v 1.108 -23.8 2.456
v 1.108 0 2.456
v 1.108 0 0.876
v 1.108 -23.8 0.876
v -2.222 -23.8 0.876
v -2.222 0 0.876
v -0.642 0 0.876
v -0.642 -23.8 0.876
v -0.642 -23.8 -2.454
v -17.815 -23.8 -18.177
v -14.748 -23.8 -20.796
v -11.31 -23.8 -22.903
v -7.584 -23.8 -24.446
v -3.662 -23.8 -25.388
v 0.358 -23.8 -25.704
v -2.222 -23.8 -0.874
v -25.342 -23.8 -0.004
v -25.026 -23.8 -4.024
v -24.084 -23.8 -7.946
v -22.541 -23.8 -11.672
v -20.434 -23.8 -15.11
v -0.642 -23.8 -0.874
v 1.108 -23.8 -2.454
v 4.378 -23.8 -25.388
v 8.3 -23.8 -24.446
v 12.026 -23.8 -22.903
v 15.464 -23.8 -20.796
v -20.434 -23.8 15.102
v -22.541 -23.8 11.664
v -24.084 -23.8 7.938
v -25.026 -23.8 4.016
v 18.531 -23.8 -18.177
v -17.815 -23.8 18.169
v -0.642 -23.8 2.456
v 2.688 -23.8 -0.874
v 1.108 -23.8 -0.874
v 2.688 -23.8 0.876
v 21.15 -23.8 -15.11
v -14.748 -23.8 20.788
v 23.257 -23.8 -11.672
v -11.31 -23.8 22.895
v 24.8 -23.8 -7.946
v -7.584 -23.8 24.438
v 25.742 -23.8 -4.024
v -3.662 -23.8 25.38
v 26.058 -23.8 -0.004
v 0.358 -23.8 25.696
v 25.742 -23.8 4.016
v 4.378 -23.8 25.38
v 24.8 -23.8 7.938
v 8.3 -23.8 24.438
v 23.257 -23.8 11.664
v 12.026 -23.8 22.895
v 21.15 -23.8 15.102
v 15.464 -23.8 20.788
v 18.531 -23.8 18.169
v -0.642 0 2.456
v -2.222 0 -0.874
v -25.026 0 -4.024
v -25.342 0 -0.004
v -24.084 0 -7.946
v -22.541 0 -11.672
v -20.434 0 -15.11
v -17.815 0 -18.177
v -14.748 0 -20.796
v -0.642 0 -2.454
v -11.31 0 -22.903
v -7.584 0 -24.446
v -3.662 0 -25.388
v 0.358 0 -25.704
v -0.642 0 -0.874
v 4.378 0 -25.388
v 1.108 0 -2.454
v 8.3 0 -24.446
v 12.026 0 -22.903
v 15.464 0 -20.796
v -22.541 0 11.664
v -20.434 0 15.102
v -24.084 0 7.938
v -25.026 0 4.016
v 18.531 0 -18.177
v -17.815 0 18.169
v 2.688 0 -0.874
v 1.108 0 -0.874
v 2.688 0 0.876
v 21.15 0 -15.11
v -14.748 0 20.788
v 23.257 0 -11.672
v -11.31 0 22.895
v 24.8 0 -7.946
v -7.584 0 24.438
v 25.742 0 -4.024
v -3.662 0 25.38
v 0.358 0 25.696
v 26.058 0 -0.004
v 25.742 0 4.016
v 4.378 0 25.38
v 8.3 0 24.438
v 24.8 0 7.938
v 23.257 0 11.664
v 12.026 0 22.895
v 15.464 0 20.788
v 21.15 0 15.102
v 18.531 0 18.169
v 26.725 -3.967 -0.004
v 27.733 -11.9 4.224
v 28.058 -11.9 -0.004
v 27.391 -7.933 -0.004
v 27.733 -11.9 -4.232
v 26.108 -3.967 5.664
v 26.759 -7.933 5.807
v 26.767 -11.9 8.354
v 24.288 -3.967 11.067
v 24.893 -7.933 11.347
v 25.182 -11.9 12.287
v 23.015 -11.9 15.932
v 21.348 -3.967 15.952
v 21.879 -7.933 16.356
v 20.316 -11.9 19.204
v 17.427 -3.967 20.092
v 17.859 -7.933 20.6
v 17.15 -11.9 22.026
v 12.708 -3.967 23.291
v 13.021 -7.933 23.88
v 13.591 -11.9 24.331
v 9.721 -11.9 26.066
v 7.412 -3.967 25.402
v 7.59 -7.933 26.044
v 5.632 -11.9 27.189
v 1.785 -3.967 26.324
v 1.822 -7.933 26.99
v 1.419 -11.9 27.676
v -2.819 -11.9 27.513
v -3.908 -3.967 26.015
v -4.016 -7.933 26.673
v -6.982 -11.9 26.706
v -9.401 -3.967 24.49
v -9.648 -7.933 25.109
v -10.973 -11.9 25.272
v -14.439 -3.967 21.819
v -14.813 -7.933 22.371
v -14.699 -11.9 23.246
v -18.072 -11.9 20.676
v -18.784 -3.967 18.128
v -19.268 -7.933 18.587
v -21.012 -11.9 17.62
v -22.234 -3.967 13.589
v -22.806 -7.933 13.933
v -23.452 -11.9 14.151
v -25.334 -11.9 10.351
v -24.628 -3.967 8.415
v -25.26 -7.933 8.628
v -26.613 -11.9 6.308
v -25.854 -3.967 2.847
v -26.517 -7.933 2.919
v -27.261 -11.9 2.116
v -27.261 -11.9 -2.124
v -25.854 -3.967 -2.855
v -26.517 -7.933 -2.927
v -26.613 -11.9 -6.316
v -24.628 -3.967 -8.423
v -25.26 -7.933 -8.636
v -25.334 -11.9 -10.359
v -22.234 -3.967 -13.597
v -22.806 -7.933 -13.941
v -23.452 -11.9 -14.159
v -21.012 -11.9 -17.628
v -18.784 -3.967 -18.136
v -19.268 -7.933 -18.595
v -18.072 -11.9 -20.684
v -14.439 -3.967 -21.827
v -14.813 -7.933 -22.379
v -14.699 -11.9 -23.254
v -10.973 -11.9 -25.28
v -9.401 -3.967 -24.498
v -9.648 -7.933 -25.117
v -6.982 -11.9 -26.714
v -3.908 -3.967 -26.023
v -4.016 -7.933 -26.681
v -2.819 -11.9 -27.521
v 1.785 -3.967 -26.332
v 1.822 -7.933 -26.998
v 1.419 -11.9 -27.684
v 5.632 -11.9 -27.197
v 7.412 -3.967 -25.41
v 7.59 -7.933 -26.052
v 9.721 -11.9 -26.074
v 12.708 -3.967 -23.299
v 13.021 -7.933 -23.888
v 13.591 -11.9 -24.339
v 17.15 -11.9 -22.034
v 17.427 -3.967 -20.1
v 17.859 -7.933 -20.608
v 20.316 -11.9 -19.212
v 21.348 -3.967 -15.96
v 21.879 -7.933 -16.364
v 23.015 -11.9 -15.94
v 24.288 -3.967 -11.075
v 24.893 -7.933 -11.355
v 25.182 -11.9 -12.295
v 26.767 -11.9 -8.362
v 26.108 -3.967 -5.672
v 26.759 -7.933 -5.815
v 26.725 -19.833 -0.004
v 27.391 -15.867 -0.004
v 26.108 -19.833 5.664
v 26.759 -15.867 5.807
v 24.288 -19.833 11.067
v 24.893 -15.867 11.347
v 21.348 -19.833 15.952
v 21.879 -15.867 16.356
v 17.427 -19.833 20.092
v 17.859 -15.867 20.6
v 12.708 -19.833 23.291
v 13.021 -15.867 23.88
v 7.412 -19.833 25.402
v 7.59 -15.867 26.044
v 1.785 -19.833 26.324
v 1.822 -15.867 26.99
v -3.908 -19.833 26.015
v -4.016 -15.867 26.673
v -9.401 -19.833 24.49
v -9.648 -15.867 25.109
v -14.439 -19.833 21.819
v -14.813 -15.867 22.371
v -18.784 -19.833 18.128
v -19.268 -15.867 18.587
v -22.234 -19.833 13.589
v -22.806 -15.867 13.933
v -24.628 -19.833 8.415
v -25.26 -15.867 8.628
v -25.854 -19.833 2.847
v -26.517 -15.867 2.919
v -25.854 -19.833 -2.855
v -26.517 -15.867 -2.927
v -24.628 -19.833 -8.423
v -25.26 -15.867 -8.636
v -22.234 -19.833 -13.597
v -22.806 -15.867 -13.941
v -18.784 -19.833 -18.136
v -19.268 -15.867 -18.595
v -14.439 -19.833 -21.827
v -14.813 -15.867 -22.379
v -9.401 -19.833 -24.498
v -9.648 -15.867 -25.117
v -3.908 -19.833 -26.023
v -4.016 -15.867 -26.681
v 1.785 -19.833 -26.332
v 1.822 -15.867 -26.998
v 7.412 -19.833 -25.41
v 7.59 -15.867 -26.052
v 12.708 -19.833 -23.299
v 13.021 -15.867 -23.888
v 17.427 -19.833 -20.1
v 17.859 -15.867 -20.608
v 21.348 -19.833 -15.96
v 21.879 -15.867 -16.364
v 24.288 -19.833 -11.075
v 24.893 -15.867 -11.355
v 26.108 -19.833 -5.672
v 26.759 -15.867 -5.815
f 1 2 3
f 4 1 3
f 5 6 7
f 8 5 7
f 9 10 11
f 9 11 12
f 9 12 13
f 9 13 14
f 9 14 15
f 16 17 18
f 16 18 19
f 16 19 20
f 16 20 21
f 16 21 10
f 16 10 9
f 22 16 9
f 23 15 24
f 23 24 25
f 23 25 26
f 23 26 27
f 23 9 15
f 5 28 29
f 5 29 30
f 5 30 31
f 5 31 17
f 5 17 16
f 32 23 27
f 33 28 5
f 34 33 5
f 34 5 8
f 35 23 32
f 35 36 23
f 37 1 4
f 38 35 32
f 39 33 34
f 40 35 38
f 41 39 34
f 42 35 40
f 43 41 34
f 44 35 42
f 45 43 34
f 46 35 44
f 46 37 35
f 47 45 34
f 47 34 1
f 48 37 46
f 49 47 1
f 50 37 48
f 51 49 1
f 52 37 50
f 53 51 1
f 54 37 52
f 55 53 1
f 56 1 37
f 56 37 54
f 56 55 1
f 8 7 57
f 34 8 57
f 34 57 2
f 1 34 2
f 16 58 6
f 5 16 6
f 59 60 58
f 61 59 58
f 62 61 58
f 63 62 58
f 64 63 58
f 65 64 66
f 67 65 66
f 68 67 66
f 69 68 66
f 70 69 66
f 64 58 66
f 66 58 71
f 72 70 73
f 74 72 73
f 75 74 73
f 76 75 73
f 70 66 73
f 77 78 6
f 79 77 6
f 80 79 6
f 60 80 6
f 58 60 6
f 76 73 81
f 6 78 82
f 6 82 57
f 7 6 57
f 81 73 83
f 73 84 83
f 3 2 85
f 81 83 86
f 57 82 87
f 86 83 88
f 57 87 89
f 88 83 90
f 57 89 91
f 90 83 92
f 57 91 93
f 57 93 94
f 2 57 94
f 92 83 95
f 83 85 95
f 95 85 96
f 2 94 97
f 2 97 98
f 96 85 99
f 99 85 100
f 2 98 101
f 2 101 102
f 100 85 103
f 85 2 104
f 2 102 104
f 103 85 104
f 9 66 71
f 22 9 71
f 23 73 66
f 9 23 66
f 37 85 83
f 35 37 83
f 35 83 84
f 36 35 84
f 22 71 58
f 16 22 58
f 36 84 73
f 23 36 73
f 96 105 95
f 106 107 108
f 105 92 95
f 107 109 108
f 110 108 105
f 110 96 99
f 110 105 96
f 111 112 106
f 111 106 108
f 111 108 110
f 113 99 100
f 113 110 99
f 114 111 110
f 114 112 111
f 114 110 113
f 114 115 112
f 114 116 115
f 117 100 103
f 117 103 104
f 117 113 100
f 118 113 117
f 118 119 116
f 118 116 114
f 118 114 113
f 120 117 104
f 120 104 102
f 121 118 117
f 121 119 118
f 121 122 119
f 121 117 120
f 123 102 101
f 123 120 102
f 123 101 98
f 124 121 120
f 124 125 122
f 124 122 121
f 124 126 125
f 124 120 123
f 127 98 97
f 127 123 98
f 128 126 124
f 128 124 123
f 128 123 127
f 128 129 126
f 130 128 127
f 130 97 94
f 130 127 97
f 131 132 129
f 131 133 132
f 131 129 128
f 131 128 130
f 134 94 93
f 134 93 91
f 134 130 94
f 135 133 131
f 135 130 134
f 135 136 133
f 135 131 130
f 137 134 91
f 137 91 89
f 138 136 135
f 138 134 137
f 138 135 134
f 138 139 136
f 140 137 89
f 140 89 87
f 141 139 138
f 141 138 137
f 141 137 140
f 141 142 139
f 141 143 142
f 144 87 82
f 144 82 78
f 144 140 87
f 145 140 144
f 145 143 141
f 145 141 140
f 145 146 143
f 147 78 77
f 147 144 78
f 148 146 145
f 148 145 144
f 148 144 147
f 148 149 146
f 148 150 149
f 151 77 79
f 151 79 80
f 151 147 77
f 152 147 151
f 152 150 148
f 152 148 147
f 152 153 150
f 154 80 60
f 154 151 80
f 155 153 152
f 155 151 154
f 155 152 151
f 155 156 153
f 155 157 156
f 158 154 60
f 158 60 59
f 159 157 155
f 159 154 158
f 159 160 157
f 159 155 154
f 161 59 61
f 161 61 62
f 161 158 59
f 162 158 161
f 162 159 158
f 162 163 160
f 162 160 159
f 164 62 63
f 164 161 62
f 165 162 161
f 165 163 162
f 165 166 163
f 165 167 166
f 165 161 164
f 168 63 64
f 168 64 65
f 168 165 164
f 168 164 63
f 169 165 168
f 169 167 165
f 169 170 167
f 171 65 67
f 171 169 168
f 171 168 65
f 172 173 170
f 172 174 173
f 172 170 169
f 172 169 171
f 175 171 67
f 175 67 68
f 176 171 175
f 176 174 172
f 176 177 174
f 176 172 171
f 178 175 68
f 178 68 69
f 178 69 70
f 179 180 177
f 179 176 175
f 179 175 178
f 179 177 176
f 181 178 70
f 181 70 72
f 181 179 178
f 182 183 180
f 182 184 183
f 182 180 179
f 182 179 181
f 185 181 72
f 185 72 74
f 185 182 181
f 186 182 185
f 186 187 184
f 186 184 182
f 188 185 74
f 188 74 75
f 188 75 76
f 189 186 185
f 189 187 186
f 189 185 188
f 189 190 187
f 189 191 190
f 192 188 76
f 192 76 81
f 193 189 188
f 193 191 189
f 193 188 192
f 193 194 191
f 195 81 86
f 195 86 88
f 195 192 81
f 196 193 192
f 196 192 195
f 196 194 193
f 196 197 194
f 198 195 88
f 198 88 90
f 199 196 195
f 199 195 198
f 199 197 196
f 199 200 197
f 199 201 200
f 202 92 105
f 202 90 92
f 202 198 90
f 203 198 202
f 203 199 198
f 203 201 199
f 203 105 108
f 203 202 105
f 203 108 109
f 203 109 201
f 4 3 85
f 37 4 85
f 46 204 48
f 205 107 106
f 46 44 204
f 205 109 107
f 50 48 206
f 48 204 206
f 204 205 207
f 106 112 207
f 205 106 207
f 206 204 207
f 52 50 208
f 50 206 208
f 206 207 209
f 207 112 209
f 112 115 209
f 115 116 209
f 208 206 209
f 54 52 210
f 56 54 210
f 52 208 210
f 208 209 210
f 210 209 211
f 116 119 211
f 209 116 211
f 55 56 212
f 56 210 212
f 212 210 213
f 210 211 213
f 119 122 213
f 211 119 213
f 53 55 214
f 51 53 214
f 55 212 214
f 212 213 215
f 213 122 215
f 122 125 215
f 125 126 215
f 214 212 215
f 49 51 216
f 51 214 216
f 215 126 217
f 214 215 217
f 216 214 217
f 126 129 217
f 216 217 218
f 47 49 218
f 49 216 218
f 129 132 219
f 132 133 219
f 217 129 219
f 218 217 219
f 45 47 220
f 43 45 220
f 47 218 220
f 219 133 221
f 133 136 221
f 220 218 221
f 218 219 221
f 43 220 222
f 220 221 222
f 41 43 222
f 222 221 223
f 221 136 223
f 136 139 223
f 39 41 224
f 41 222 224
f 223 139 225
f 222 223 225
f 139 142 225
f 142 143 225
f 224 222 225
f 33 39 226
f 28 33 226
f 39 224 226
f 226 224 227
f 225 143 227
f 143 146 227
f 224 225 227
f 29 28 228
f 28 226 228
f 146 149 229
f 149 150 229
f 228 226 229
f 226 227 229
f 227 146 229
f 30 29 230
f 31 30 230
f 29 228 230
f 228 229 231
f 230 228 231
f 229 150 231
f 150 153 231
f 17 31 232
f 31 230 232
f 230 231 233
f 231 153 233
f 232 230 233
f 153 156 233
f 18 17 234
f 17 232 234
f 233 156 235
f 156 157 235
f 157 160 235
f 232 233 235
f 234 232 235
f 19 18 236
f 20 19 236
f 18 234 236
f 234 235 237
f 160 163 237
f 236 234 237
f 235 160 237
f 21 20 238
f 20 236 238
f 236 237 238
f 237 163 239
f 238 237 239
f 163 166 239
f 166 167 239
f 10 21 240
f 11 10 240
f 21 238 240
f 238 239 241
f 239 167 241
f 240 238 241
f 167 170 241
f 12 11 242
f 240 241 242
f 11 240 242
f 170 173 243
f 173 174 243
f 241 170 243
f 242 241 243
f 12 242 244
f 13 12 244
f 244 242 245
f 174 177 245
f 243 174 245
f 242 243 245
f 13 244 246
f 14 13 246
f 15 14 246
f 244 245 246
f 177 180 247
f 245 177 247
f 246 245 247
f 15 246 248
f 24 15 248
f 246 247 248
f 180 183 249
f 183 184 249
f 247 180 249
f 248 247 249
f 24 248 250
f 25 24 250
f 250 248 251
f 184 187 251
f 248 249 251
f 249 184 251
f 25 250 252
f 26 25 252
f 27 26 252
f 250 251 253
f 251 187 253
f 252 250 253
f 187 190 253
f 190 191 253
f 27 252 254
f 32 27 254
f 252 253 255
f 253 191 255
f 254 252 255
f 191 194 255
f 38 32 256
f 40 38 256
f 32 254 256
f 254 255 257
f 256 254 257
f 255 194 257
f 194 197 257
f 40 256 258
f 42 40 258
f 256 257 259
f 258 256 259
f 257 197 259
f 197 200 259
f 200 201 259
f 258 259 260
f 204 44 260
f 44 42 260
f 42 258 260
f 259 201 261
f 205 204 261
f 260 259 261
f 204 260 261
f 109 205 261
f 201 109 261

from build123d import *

# Parameters (mm, degrees)
F0_R       = 27.7
F1_DEPTH   = 23.8
F2_SIZE2   = 11.9
F2_SIZE    = 2
F2_2_SIZE2 = 11.89999
F2_2_SIZE  = 1.99999


# Not quite as in the source:
# - a fillet or chamfer is up to 0.001 mm smaller than in the source, because OpenCascade refuses the exact size


with BuildPart() as f1:
    # F0 (on Front) → F1 (new body)
    with BuildSketch(Plane.XZ):
        with Locations((0.358, -0.004)):
            Circle(F0_R)
        Polygon((-2.222, -0.874), (-2.222, -0.004), (-2.222, 0.876), (-0.642, 0.876), (-0.642, 2.456), (1.108, 2.456), (1.108, 0.876), (2.688, 0.876), (2.688, -0.874), (1.108, -0.874), (1.108, -2.454), (-0.642, -2.454), (-0.642, -0.874), align=None, mode=Mode.SUBTRACT)
    extrude(amount=F1_DEPTH)

    # F2
    f2_edges = [f1.edges().sort_by_distance(p)[0] for p in [
        (-27.342, -23.8, -0.004),
    ]]
    f2_side = f1.faces().sort_by_distance((-26.558526, -23.8, -0.004))[0]
    chamfer(f2_edges, length=F2_SIZE, length2=F2_SIZE2, reference=f2_side)

    # F2#2 (size 2 and 11.9 in the source; OpenCascade refuses exactly that, so slightly less here)
    f2_2_edges = [f1.edges().sort_by_distance(p)[0] for p in [
        (-27.342, 0, -0.004),
    ]]
    f2_2_side = f1.faces().sort_by_distance((-26.558526, 0, -0.004))[0]
    chamfer(f2_2_edges, length=F2_2_SIZE, length2=F2_2_SIZE2, reference=f2_2_side)


solid = f1.part
